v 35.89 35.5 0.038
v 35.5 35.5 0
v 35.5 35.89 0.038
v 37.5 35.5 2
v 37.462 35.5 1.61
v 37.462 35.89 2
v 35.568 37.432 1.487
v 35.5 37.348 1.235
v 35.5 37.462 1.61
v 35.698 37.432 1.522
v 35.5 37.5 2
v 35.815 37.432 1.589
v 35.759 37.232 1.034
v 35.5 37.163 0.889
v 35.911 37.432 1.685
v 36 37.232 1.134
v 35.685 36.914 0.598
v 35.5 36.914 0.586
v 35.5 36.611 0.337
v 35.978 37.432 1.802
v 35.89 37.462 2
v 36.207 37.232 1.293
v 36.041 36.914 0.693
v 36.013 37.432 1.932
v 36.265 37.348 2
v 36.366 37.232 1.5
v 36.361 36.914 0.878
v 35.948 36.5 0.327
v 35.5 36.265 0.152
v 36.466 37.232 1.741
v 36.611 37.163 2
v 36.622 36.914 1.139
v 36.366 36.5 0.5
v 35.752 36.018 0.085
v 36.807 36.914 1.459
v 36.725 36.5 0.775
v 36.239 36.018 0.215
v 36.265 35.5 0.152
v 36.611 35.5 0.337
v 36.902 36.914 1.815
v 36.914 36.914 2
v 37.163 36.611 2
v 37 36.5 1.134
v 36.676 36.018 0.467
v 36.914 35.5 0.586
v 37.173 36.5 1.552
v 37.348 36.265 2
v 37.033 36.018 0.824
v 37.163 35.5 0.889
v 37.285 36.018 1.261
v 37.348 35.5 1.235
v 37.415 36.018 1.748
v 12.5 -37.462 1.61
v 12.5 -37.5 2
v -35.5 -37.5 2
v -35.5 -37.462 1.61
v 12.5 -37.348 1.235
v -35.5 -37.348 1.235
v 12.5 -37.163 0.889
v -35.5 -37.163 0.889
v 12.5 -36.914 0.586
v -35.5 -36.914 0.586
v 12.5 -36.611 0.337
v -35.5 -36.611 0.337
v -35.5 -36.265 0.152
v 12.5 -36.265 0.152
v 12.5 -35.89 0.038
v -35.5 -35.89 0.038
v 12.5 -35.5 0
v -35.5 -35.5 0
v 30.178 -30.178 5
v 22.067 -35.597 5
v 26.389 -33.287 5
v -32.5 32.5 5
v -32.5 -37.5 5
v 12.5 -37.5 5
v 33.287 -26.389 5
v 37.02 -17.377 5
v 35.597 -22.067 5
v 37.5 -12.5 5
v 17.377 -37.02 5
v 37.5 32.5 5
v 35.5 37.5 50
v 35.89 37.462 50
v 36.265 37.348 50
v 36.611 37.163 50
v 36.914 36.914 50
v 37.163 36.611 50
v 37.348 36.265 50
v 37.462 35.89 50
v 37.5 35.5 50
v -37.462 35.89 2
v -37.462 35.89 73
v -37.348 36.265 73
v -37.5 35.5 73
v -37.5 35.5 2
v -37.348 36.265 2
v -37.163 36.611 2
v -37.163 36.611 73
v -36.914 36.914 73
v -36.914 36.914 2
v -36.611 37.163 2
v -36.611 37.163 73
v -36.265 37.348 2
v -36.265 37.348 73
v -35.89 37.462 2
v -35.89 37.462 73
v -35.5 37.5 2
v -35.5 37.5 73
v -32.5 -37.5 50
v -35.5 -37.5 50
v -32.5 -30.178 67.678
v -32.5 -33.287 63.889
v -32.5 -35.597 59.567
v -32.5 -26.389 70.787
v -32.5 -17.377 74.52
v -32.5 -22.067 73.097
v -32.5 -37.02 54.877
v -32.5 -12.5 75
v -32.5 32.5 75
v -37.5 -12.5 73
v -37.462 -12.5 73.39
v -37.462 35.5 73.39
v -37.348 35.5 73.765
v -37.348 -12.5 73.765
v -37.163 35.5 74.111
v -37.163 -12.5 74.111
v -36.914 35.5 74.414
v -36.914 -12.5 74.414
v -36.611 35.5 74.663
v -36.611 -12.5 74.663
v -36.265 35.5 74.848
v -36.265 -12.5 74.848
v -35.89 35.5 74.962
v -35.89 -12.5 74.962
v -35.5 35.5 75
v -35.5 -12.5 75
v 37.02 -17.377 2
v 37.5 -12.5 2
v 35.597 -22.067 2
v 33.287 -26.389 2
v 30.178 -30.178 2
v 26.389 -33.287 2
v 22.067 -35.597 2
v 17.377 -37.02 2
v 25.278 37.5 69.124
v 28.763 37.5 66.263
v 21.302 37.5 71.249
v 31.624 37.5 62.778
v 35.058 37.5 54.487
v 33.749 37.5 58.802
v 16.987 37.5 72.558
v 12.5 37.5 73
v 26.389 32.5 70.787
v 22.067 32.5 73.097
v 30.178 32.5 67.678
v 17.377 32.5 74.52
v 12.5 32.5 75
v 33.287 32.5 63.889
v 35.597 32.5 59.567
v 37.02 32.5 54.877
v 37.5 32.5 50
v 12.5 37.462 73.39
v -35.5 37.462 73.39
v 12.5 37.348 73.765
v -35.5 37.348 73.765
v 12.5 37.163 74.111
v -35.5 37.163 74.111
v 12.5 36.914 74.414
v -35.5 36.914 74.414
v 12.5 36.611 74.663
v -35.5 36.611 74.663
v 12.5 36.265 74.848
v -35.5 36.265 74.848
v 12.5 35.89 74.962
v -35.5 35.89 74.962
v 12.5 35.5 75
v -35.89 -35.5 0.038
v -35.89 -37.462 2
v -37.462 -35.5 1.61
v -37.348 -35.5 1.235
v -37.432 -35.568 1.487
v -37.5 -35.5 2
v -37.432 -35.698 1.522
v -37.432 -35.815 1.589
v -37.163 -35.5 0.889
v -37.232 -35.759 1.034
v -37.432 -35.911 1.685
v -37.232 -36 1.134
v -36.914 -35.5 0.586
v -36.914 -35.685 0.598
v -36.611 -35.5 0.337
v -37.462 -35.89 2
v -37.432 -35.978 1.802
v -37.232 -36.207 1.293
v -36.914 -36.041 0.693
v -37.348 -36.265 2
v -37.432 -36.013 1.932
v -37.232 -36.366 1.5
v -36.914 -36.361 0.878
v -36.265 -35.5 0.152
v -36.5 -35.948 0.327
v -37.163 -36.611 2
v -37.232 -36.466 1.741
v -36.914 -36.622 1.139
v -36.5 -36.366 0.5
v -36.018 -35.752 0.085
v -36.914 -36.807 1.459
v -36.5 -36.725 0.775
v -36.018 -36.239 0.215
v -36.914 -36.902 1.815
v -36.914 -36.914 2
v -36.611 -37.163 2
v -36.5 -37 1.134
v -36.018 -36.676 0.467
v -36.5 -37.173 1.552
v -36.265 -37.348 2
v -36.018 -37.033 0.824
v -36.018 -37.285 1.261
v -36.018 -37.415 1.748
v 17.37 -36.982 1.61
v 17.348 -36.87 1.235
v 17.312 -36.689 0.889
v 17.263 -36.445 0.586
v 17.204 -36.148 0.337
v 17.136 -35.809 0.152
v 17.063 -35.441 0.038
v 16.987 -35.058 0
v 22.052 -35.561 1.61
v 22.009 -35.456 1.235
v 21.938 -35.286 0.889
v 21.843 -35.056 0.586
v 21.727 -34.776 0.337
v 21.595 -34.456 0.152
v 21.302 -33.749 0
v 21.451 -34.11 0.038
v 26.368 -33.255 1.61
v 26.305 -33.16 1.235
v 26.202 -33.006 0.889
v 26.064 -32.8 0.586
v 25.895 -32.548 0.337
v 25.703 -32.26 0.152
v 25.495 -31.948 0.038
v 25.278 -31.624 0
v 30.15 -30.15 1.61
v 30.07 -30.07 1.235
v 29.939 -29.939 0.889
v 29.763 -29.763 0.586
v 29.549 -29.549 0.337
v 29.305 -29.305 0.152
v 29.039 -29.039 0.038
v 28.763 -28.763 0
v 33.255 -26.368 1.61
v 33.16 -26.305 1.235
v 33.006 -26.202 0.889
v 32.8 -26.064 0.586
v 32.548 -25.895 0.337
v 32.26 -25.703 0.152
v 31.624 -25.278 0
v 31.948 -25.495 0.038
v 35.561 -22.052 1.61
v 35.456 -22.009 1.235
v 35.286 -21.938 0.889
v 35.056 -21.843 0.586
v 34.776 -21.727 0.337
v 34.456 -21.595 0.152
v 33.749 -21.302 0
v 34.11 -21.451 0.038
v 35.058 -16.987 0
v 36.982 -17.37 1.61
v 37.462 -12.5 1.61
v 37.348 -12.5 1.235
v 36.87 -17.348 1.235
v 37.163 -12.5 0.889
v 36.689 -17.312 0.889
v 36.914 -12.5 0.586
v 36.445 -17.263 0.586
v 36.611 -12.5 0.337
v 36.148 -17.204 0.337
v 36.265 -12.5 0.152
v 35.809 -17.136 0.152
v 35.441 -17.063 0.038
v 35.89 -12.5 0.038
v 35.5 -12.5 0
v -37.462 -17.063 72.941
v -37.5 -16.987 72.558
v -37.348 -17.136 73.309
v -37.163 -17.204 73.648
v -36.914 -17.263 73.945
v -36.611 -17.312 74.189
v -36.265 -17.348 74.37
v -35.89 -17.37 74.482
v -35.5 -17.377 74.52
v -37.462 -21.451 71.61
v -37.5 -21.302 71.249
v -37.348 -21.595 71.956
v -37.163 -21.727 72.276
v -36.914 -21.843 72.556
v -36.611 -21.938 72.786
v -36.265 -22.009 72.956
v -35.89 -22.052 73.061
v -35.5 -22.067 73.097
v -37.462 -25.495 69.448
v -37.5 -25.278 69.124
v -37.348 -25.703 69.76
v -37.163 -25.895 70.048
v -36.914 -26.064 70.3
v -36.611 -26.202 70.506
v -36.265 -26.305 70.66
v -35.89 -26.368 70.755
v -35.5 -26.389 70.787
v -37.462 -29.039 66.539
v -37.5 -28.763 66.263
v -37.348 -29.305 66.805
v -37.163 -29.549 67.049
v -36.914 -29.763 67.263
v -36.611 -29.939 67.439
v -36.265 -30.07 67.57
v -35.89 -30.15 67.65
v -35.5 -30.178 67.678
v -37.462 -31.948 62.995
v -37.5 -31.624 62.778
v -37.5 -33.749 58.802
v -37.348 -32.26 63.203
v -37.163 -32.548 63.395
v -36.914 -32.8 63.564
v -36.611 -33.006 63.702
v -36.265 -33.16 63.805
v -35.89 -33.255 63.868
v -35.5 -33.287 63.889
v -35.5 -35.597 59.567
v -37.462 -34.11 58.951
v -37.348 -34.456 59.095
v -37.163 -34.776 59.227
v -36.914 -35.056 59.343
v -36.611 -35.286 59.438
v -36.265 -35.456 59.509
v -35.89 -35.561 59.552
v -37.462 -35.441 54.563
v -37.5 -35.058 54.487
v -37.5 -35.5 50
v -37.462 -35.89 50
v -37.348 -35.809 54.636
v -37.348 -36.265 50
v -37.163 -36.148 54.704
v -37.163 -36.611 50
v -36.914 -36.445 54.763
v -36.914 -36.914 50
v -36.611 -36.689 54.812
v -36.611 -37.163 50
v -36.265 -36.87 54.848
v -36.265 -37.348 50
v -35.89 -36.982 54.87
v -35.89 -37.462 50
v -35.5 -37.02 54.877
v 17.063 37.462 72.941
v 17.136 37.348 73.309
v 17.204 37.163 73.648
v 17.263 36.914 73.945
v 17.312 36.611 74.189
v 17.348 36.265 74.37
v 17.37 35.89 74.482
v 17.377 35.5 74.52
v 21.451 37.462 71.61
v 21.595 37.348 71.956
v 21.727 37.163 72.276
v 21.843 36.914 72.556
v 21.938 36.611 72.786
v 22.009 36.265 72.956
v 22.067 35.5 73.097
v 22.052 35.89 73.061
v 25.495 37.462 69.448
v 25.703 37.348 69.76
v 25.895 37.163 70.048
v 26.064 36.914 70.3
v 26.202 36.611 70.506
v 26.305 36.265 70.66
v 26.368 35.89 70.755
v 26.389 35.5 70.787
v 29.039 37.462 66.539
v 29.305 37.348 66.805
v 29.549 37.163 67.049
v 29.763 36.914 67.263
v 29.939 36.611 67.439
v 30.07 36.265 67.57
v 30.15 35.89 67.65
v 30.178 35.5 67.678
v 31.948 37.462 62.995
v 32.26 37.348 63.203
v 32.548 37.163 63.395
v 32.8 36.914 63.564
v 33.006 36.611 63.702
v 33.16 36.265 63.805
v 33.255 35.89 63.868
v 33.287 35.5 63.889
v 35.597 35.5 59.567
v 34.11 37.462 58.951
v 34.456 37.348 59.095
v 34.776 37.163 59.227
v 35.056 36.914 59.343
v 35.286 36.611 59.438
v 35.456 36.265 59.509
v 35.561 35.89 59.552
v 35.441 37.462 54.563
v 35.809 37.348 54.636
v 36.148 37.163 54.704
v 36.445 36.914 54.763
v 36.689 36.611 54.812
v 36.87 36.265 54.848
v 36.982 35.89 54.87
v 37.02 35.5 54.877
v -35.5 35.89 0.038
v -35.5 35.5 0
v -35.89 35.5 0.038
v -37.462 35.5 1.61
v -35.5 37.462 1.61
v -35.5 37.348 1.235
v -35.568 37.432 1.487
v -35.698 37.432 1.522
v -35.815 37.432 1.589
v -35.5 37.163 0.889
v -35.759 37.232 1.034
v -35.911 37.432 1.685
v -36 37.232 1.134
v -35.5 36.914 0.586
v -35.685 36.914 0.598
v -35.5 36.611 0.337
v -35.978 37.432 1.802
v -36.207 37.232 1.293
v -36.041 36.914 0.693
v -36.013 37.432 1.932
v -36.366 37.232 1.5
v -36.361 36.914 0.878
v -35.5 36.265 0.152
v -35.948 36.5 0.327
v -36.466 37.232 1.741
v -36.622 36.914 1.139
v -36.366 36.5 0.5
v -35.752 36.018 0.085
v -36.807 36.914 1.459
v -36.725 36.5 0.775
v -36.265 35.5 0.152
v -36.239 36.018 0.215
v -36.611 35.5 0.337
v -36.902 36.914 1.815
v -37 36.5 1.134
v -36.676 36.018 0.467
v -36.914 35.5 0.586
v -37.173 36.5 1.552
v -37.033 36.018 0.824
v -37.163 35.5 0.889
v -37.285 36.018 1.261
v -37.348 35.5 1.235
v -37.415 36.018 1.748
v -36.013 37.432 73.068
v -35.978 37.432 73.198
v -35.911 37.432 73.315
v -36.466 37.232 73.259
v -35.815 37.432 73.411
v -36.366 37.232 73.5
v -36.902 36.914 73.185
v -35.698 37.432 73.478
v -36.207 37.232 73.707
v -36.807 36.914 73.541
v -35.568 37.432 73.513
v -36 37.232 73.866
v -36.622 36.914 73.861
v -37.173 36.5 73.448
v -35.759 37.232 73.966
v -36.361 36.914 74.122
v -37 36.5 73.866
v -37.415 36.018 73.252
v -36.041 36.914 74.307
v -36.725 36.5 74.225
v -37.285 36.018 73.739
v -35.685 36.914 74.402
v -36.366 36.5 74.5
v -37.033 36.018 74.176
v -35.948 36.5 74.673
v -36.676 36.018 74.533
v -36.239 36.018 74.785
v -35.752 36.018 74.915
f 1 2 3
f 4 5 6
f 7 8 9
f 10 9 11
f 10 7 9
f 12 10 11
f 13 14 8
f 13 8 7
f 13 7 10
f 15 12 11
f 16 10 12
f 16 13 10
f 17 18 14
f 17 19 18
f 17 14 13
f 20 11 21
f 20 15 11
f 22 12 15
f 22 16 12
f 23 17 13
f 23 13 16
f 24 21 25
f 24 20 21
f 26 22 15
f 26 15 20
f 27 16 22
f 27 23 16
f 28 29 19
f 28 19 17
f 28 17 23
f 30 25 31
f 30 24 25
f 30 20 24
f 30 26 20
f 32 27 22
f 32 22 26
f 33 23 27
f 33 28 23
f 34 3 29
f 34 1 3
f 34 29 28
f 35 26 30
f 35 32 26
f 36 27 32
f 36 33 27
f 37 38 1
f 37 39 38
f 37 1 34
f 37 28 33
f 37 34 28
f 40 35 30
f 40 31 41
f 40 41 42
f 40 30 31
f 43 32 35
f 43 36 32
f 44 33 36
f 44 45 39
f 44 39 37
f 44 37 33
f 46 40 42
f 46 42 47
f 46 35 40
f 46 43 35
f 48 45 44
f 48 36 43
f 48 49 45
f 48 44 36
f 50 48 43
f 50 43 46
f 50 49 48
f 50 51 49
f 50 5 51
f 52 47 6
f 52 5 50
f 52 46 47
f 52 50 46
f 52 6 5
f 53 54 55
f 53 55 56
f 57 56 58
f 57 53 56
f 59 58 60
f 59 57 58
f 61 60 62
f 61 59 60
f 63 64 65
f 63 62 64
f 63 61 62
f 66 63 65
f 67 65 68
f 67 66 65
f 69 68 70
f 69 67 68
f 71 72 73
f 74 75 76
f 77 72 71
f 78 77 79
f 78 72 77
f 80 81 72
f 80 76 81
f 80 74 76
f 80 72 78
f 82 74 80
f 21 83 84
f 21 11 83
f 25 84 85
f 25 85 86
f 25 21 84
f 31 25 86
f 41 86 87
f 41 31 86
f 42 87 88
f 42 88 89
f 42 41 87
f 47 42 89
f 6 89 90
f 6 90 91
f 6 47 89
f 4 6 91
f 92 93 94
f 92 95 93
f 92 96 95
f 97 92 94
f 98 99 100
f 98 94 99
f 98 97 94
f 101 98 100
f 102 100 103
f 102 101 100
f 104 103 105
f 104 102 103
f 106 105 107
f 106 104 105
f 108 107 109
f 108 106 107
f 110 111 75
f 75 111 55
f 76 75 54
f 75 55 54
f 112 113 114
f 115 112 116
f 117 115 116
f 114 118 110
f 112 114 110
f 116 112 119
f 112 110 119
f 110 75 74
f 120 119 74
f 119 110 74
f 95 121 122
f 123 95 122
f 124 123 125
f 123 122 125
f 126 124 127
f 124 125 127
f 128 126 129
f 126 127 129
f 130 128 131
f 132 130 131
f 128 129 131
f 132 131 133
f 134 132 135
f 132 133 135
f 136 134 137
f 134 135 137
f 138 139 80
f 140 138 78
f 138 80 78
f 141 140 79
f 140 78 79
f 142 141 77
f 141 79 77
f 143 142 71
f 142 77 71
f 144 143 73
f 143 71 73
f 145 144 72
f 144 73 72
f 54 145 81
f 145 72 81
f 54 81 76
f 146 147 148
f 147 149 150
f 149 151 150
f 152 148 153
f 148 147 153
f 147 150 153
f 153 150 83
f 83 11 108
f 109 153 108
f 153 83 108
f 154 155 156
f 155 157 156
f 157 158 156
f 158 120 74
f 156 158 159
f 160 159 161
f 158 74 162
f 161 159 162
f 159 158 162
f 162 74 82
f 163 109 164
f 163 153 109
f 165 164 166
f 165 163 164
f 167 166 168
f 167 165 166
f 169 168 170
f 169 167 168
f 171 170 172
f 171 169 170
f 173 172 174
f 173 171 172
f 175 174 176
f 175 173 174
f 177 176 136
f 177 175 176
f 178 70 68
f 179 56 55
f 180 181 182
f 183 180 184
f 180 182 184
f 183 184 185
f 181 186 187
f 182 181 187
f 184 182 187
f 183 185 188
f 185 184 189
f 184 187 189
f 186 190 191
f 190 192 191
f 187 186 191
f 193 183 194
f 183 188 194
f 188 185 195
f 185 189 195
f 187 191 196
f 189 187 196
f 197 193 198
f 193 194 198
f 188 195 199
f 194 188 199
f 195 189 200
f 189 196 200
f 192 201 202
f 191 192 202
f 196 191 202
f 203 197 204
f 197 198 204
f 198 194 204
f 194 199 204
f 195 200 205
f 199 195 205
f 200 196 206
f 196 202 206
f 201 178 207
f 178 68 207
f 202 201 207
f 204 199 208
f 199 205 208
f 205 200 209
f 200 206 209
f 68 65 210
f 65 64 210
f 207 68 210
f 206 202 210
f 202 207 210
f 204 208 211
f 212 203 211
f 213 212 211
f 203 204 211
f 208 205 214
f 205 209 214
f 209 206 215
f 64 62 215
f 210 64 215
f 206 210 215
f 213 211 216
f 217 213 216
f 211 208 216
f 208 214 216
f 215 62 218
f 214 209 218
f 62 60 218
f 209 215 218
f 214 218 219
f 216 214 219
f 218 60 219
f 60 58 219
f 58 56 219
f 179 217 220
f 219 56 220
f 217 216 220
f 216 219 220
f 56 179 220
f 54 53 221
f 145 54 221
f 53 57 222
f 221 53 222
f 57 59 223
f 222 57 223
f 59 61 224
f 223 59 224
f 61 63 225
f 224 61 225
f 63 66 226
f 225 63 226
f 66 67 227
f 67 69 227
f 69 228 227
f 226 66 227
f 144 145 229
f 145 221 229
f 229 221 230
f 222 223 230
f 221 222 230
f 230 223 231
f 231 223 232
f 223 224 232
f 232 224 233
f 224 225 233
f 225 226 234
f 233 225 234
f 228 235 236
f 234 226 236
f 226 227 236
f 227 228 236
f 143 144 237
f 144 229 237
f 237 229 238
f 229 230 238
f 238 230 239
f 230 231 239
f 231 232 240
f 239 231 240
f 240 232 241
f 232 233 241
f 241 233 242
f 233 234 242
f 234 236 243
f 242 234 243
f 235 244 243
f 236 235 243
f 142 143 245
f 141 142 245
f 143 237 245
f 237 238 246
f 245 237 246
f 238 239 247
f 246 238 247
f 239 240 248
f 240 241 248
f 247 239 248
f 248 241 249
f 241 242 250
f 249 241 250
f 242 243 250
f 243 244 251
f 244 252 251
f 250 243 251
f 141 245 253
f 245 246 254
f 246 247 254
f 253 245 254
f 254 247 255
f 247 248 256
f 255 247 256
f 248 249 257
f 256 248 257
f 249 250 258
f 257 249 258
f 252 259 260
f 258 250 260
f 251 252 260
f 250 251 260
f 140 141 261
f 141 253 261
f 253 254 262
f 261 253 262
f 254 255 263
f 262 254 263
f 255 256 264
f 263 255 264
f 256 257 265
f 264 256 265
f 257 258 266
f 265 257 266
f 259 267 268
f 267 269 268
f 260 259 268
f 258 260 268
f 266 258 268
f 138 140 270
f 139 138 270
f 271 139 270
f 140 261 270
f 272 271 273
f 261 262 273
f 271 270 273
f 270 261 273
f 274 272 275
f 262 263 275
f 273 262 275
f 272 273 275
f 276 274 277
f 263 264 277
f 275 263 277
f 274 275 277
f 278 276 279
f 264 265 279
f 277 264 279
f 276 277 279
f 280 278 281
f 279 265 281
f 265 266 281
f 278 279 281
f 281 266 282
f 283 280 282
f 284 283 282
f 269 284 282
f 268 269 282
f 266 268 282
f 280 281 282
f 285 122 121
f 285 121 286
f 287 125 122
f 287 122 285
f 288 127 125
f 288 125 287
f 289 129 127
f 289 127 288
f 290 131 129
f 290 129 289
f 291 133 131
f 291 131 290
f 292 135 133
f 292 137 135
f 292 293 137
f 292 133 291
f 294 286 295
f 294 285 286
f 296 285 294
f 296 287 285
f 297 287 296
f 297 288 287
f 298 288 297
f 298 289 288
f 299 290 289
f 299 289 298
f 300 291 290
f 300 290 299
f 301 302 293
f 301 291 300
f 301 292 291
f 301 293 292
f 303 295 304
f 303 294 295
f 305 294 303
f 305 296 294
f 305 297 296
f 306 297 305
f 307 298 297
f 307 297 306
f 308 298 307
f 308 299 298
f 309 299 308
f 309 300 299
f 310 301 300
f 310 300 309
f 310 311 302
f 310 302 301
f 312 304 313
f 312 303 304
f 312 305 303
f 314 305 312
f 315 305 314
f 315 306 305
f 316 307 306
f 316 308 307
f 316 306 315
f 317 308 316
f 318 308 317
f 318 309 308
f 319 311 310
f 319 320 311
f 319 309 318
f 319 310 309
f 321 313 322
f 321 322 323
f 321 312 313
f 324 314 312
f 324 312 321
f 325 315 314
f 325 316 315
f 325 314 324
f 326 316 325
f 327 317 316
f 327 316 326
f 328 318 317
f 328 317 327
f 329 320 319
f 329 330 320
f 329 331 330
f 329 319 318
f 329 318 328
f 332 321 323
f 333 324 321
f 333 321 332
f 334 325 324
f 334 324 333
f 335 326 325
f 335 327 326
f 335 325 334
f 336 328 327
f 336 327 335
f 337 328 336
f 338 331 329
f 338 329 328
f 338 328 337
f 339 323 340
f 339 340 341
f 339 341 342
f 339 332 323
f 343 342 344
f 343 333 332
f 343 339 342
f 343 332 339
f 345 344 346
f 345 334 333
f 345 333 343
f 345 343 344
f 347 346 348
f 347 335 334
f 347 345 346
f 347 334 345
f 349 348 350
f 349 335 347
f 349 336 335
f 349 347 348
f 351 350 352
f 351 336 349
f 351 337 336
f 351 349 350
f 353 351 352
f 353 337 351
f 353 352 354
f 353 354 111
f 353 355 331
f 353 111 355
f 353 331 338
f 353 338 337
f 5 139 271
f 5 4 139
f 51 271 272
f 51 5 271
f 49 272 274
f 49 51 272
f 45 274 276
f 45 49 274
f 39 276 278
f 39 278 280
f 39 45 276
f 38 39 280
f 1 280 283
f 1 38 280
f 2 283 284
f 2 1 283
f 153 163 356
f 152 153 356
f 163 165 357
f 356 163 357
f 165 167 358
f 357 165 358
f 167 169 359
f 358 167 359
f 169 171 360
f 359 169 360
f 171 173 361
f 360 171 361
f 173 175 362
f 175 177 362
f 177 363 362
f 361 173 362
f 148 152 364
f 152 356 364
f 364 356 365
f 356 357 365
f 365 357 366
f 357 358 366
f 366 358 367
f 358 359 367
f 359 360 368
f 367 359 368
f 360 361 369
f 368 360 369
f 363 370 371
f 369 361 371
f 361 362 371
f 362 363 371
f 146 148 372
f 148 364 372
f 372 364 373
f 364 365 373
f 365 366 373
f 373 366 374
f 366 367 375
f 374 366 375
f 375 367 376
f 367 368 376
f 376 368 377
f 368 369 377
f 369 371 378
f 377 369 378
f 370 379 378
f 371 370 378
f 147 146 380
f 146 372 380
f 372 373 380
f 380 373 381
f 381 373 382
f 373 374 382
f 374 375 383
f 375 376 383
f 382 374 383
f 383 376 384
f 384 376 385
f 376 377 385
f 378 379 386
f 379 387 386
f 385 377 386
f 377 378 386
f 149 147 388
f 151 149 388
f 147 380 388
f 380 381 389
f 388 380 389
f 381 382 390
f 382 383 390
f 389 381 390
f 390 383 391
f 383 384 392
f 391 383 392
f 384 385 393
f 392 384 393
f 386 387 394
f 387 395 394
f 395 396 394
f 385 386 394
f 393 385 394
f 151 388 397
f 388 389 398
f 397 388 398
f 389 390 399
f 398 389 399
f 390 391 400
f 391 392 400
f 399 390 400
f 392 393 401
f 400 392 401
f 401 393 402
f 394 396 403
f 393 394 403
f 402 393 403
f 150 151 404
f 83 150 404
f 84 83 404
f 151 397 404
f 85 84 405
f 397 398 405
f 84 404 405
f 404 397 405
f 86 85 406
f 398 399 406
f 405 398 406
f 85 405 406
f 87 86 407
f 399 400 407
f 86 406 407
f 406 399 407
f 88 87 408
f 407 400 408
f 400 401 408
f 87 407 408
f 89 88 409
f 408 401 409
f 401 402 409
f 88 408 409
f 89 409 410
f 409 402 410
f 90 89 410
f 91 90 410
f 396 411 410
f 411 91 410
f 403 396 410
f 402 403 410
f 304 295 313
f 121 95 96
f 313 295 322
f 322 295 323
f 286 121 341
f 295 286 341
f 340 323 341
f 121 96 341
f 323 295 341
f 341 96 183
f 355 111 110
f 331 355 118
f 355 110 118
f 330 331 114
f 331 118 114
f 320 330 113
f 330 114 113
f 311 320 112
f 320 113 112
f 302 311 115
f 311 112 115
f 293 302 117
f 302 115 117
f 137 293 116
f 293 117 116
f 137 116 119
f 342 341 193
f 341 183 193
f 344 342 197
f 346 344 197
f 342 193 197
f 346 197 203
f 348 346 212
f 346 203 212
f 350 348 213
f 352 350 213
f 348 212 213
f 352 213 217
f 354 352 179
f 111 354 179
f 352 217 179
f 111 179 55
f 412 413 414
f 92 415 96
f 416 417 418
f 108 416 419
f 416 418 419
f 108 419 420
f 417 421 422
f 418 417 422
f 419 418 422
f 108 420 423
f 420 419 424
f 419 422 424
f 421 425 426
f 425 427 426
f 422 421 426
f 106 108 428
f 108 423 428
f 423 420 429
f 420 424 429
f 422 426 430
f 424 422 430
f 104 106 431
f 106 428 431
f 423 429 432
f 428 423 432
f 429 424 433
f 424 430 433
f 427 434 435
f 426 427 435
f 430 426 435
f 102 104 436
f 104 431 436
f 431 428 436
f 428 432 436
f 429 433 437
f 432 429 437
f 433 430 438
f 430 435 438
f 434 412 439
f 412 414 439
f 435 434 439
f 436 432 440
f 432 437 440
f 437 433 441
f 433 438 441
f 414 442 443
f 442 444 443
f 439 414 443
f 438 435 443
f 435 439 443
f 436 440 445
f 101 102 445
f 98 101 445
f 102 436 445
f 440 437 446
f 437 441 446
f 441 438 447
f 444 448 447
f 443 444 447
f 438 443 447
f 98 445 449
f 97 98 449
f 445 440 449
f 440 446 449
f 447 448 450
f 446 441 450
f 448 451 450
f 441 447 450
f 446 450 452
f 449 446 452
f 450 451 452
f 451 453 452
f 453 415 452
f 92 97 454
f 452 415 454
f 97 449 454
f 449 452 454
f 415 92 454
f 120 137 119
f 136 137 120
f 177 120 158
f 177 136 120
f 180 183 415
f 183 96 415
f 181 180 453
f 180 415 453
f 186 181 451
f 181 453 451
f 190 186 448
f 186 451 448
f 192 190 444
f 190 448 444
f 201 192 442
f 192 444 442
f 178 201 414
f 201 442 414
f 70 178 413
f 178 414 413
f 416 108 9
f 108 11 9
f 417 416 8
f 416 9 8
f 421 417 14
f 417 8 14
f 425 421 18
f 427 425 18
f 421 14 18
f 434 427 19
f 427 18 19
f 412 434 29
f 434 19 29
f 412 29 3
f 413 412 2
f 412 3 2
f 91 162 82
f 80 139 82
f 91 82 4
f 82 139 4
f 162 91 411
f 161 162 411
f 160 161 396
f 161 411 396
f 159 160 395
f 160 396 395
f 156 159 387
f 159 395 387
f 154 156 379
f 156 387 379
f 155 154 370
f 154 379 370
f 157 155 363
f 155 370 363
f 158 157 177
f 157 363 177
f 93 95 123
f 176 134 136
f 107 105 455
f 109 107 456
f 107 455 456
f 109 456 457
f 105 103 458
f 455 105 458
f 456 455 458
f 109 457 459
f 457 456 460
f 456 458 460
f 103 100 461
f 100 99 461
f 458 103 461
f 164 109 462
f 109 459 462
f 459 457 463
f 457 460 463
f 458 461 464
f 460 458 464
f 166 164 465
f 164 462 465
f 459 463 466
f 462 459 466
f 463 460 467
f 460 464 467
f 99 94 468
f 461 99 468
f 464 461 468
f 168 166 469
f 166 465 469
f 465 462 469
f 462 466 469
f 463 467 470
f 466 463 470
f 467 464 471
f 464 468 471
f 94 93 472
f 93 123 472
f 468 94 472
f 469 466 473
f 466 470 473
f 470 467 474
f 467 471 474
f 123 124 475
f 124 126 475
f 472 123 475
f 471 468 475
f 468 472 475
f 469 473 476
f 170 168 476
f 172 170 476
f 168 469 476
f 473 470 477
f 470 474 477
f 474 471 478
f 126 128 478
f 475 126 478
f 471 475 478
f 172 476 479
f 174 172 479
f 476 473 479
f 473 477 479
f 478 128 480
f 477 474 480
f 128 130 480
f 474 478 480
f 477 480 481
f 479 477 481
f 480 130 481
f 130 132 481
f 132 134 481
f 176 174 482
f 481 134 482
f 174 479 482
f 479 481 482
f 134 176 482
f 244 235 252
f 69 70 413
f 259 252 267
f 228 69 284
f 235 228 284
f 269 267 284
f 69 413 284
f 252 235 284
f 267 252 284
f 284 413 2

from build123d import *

# Parameters (mm, degrees)
F0_W     = 75
F0_H     = 75
F1_DEPTH = 5
F2_W     = 70
F2_H     = 5
F3_DEPTH = 70
F4_R     = 25
F5_R     = 2


with BuildPart() as f1:
    # F0 (on Top) → F1 (new body)
    with BuildSketch(Plane.XY):
        Rectangle(F0_W, F0_H)
    extrude(amount=F1_DEPTH)

    # F2 (on face) → F3 (join)
    with BuildSketch(Plane.XY.offset(5)):
        Polygon((-32.5, 37.5), (-37.5, 37.5), (-37.5, -37.5), (-32.5, -37.5), (-32.5, 32.5), align=None)
        with Locations((2.5, 35)):
            Rectangle(F2_W, F2_H)
    extrude(amount=F3_DEPTH)

    # F4
    f4_edges = [f1.edges().sort_by_distance(p)[0] for p in [
        (37.5, 35, 75),
        (-35, -37.5, 75),
        (37.5, -37.5, 2.5),
    ]]
    fillet(f4_edges, radius=F4_R)

    # F5
    f5_edges = [f1.edges().sort_by_distance(p)[0] for p in [
        (-12.5, -37.5, 0),
        (30.17767, -30.17767, 0),
        (-37.5, 0, 0),
        (37.5, 12.5, 0),
        (0, 37.5, 0),
        (-37.5, 12.5, 75),
        (-37.5, -30.17767, 67.67767),
        (-37.5, 37.5, 37.5),
        (-37.5, -37.5, 25),
        (37.5, 37.5, 25),
        (30.17767, 37.5, 67.67767),
        (-12.5, 37.5, 75),
    ]]
    fillet(f5_edges, radius=F5_R)


solid = f1.part
